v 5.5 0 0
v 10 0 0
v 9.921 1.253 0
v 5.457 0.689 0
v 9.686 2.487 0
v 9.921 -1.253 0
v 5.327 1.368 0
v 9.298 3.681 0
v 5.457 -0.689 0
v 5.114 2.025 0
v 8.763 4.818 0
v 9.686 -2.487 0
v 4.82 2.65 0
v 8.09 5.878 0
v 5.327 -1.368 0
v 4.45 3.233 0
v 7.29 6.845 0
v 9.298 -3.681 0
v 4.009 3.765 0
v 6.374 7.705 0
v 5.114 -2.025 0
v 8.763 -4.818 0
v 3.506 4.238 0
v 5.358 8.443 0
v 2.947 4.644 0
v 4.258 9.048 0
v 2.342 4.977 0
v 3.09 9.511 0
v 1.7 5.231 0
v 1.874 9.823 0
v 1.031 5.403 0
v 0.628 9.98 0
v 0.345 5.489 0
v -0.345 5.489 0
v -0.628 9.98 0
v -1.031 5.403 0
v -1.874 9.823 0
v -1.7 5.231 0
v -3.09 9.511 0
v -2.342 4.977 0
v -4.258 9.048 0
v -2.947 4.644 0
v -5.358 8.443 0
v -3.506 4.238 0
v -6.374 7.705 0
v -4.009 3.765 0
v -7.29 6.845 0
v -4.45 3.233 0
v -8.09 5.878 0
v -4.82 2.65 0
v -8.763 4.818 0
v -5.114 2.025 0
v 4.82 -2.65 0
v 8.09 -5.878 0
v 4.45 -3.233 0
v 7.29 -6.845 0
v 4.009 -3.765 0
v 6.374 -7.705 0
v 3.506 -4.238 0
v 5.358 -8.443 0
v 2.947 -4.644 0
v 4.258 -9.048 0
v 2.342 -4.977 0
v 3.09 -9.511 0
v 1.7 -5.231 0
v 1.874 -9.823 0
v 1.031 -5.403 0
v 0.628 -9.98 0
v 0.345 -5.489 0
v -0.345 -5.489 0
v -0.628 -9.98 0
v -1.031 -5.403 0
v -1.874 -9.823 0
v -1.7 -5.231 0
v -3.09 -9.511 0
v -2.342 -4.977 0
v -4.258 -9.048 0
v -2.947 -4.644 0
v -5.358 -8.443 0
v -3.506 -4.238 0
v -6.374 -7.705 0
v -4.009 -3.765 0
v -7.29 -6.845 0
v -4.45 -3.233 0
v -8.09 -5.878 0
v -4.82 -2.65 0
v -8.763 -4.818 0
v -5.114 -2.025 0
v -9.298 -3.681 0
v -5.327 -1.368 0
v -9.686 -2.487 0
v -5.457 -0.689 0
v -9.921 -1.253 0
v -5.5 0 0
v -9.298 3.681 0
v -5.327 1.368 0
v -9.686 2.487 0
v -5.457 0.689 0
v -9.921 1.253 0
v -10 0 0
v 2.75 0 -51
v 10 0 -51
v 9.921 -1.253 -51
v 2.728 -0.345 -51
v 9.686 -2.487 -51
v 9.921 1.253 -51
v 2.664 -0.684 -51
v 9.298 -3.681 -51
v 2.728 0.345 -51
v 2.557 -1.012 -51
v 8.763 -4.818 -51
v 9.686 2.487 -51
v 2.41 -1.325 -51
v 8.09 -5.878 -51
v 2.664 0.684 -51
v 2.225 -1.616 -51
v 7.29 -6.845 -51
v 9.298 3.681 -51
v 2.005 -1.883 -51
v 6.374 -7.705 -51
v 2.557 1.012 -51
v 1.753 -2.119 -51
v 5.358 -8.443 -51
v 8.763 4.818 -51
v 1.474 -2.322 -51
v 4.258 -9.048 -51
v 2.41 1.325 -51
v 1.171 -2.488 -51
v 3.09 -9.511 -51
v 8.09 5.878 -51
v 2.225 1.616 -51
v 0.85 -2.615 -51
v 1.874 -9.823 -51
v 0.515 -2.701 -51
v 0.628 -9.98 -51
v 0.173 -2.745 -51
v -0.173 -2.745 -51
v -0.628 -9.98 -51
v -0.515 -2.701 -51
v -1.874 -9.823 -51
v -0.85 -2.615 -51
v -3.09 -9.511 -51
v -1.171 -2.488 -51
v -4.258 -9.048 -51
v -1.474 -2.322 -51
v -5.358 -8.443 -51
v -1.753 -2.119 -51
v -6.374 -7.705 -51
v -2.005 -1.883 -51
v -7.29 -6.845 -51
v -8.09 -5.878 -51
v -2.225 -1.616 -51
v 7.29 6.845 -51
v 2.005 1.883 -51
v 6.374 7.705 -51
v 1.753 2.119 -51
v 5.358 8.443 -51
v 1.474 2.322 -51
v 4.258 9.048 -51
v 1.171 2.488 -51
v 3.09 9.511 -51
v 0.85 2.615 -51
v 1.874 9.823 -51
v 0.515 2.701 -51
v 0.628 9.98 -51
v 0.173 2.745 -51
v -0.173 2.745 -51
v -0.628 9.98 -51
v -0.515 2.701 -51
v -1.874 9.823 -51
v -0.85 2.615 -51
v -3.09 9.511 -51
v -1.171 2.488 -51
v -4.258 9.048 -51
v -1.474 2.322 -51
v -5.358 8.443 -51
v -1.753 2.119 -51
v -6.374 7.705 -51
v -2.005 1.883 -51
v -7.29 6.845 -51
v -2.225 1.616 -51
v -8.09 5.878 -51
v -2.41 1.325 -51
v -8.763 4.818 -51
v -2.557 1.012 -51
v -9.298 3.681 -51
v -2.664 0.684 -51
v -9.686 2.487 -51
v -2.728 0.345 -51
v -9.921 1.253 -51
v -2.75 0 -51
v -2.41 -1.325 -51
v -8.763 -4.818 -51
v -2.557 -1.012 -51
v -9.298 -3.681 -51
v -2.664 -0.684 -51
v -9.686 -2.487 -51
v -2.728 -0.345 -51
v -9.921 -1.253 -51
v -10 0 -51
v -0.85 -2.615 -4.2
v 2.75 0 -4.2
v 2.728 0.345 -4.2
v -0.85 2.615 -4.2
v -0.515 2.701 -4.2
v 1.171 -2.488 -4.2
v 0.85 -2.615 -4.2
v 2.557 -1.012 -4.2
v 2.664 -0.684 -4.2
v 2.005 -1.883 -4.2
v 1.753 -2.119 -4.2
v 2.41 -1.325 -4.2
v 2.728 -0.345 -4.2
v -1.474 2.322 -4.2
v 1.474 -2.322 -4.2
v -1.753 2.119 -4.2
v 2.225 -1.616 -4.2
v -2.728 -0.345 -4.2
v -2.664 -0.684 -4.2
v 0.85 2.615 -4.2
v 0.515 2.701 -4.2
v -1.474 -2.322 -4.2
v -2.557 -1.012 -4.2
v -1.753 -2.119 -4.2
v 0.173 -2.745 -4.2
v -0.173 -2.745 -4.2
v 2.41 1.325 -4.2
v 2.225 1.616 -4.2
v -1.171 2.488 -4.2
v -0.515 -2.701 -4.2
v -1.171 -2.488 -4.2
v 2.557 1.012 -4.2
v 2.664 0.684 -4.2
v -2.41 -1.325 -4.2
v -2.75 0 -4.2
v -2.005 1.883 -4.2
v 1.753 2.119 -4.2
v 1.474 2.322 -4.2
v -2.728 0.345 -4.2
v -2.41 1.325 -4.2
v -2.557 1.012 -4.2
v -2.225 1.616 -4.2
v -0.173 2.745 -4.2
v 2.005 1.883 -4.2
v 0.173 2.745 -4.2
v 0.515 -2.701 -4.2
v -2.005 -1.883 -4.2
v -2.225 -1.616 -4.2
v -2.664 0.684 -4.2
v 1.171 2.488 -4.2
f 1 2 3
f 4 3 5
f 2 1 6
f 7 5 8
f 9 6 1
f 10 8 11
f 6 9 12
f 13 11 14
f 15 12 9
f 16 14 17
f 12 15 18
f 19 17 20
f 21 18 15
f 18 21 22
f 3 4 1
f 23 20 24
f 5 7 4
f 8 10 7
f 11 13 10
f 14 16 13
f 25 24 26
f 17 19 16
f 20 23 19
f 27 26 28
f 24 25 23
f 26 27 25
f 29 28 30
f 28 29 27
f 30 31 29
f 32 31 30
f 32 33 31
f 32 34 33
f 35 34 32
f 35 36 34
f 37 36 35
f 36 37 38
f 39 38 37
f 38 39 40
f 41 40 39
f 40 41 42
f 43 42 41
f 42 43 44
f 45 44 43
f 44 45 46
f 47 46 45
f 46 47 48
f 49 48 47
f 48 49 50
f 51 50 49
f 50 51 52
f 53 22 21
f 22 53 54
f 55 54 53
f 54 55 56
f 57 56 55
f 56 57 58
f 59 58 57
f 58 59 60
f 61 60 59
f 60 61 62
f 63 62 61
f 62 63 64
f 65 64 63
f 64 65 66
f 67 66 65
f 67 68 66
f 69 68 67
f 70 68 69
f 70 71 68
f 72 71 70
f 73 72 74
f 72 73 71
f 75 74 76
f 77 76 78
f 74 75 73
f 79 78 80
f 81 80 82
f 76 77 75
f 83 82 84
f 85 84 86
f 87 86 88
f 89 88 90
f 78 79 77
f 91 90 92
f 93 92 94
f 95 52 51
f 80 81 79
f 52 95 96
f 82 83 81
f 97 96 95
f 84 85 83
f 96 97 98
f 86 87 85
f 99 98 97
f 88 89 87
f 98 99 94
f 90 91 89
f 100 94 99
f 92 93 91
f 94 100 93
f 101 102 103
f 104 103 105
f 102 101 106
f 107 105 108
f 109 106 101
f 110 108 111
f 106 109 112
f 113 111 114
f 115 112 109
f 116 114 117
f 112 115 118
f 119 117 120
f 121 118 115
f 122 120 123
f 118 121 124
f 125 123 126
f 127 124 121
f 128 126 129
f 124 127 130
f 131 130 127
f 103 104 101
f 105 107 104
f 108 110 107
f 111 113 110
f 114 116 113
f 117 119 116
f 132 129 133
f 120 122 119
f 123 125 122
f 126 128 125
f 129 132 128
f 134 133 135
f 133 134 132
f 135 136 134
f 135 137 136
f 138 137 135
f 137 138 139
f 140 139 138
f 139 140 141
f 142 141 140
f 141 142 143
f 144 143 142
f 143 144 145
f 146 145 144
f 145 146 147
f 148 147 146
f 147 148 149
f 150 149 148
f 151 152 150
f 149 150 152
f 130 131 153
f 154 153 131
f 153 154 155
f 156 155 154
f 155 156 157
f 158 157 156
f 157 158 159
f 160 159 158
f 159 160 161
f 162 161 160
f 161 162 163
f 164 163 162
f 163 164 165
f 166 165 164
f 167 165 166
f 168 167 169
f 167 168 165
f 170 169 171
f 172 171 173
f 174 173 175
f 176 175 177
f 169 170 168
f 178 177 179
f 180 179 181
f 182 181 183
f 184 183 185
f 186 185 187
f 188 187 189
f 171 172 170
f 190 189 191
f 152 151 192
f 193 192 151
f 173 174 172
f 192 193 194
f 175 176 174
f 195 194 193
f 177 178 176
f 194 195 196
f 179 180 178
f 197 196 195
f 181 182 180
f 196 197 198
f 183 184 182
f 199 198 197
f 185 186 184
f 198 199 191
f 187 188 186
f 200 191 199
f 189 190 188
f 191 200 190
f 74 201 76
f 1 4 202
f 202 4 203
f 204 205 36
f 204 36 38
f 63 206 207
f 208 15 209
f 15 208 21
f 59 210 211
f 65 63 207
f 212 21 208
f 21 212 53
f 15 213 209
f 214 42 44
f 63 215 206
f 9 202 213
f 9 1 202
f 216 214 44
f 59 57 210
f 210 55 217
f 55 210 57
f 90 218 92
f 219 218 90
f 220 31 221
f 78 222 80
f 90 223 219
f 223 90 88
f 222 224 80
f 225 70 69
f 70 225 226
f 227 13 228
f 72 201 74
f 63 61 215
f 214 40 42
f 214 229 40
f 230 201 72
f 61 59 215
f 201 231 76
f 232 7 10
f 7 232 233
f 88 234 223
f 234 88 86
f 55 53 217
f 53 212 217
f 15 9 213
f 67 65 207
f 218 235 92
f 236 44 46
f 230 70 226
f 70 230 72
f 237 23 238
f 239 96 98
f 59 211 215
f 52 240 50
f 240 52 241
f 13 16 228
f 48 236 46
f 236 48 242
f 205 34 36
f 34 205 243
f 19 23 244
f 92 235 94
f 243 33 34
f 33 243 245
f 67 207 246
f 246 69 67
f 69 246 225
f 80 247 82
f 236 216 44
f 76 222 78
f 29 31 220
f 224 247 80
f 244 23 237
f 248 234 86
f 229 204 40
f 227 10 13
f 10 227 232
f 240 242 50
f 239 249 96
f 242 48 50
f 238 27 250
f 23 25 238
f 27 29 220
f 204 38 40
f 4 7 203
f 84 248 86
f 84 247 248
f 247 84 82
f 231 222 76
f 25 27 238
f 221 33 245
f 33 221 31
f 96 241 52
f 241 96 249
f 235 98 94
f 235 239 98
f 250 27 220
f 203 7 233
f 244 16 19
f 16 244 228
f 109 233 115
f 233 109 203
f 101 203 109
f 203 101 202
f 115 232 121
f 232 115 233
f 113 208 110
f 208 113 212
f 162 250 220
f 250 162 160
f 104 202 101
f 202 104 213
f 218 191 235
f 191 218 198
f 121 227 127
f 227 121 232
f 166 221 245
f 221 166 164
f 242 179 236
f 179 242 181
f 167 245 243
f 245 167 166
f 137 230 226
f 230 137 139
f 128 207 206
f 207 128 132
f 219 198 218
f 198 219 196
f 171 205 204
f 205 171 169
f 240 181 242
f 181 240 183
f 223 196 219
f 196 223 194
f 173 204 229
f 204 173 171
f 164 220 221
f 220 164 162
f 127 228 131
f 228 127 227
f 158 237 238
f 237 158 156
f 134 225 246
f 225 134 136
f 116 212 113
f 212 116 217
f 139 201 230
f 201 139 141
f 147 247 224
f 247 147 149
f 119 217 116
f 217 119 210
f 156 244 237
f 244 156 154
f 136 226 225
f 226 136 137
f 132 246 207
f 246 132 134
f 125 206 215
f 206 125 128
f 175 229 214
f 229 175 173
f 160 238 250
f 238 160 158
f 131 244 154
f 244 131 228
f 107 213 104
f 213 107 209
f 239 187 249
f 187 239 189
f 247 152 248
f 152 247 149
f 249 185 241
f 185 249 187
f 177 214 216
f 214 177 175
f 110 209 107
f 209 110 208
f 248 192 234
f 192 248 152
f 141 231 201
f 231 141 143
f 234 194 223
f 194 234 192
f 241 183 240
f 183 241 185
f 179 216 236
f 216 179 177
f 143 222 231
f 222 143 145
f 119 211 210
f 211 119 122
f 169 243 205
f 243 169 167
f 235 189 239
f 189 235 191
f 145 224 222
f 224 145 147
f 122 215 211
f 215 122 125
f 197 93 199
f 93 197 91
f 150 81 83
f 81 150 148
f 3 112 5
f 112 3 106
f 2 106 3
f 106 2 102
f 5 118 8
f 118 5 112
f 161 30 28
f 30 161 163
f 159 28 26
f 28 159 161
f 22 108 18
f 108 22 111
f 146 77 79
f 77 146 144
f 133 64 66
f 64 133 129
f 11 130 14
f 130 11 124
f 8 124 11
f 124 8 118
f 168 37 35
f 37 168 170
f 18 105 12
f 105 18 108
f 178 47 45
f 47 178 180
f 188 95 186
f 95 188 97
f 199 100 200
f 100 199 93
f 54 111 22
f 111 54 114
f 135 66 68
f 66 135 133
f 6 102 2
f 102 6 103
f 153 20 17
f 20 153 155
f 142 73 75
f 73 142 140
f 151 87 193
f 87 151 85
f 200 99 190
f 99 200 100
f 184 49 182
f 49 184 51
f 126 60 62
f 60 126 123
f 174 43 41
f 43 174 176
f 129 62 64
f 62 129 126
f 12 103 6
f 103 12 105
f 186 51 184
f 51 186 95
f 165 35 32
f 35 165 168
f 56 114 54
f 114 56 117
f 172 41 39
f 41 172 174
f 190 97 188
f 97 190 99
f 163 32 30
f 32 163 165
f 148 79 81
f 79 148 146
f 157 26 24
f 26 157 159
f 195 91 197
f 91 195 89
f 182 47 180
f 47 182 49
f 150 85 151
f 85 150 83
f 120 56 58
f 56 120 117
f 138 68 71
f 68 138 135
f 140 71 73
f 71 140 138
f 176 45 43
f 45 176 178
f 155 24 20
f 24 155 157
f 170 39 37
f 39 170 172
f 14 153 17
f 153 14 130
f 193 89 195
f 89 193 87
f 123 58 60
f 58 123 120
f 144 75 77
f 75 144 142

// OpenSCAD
$fn = 50;


difference() {
	union() {
		translate(v = [0, 0, -51.0000000000]) {
			cylinder(h = 51, r = 10.0000000000);
		}
		cylinder(h = 0, r = 13.0000000000);
	}
	union() {
		translate(v = [0, 0, 0]) {
			rotate(a = [0, 0, 0]) {
				difference() {
					union() {
						#translate(v = [0, 0, -51.0000000000]) {
							cylinder(h = 51, r = 2.2500000000);
						}
						#translate(v = [0, 0, -4.2000000000]) {
							cylinder(h = 4.2000000000, r1 = 2.7500000000, r2 = 5.5000000000);
						}
						#translate(v = [0, 0, -51.0000000000]) {
							cylinder(h = 51, r = 2.7500000000);
						}
						#translate(v = [0, 0, -51.0000000000]) {
							cylinder(h = 51, r = 2.2500000000);
						}
					}
					union();
				}
			}
		}
	}
}
